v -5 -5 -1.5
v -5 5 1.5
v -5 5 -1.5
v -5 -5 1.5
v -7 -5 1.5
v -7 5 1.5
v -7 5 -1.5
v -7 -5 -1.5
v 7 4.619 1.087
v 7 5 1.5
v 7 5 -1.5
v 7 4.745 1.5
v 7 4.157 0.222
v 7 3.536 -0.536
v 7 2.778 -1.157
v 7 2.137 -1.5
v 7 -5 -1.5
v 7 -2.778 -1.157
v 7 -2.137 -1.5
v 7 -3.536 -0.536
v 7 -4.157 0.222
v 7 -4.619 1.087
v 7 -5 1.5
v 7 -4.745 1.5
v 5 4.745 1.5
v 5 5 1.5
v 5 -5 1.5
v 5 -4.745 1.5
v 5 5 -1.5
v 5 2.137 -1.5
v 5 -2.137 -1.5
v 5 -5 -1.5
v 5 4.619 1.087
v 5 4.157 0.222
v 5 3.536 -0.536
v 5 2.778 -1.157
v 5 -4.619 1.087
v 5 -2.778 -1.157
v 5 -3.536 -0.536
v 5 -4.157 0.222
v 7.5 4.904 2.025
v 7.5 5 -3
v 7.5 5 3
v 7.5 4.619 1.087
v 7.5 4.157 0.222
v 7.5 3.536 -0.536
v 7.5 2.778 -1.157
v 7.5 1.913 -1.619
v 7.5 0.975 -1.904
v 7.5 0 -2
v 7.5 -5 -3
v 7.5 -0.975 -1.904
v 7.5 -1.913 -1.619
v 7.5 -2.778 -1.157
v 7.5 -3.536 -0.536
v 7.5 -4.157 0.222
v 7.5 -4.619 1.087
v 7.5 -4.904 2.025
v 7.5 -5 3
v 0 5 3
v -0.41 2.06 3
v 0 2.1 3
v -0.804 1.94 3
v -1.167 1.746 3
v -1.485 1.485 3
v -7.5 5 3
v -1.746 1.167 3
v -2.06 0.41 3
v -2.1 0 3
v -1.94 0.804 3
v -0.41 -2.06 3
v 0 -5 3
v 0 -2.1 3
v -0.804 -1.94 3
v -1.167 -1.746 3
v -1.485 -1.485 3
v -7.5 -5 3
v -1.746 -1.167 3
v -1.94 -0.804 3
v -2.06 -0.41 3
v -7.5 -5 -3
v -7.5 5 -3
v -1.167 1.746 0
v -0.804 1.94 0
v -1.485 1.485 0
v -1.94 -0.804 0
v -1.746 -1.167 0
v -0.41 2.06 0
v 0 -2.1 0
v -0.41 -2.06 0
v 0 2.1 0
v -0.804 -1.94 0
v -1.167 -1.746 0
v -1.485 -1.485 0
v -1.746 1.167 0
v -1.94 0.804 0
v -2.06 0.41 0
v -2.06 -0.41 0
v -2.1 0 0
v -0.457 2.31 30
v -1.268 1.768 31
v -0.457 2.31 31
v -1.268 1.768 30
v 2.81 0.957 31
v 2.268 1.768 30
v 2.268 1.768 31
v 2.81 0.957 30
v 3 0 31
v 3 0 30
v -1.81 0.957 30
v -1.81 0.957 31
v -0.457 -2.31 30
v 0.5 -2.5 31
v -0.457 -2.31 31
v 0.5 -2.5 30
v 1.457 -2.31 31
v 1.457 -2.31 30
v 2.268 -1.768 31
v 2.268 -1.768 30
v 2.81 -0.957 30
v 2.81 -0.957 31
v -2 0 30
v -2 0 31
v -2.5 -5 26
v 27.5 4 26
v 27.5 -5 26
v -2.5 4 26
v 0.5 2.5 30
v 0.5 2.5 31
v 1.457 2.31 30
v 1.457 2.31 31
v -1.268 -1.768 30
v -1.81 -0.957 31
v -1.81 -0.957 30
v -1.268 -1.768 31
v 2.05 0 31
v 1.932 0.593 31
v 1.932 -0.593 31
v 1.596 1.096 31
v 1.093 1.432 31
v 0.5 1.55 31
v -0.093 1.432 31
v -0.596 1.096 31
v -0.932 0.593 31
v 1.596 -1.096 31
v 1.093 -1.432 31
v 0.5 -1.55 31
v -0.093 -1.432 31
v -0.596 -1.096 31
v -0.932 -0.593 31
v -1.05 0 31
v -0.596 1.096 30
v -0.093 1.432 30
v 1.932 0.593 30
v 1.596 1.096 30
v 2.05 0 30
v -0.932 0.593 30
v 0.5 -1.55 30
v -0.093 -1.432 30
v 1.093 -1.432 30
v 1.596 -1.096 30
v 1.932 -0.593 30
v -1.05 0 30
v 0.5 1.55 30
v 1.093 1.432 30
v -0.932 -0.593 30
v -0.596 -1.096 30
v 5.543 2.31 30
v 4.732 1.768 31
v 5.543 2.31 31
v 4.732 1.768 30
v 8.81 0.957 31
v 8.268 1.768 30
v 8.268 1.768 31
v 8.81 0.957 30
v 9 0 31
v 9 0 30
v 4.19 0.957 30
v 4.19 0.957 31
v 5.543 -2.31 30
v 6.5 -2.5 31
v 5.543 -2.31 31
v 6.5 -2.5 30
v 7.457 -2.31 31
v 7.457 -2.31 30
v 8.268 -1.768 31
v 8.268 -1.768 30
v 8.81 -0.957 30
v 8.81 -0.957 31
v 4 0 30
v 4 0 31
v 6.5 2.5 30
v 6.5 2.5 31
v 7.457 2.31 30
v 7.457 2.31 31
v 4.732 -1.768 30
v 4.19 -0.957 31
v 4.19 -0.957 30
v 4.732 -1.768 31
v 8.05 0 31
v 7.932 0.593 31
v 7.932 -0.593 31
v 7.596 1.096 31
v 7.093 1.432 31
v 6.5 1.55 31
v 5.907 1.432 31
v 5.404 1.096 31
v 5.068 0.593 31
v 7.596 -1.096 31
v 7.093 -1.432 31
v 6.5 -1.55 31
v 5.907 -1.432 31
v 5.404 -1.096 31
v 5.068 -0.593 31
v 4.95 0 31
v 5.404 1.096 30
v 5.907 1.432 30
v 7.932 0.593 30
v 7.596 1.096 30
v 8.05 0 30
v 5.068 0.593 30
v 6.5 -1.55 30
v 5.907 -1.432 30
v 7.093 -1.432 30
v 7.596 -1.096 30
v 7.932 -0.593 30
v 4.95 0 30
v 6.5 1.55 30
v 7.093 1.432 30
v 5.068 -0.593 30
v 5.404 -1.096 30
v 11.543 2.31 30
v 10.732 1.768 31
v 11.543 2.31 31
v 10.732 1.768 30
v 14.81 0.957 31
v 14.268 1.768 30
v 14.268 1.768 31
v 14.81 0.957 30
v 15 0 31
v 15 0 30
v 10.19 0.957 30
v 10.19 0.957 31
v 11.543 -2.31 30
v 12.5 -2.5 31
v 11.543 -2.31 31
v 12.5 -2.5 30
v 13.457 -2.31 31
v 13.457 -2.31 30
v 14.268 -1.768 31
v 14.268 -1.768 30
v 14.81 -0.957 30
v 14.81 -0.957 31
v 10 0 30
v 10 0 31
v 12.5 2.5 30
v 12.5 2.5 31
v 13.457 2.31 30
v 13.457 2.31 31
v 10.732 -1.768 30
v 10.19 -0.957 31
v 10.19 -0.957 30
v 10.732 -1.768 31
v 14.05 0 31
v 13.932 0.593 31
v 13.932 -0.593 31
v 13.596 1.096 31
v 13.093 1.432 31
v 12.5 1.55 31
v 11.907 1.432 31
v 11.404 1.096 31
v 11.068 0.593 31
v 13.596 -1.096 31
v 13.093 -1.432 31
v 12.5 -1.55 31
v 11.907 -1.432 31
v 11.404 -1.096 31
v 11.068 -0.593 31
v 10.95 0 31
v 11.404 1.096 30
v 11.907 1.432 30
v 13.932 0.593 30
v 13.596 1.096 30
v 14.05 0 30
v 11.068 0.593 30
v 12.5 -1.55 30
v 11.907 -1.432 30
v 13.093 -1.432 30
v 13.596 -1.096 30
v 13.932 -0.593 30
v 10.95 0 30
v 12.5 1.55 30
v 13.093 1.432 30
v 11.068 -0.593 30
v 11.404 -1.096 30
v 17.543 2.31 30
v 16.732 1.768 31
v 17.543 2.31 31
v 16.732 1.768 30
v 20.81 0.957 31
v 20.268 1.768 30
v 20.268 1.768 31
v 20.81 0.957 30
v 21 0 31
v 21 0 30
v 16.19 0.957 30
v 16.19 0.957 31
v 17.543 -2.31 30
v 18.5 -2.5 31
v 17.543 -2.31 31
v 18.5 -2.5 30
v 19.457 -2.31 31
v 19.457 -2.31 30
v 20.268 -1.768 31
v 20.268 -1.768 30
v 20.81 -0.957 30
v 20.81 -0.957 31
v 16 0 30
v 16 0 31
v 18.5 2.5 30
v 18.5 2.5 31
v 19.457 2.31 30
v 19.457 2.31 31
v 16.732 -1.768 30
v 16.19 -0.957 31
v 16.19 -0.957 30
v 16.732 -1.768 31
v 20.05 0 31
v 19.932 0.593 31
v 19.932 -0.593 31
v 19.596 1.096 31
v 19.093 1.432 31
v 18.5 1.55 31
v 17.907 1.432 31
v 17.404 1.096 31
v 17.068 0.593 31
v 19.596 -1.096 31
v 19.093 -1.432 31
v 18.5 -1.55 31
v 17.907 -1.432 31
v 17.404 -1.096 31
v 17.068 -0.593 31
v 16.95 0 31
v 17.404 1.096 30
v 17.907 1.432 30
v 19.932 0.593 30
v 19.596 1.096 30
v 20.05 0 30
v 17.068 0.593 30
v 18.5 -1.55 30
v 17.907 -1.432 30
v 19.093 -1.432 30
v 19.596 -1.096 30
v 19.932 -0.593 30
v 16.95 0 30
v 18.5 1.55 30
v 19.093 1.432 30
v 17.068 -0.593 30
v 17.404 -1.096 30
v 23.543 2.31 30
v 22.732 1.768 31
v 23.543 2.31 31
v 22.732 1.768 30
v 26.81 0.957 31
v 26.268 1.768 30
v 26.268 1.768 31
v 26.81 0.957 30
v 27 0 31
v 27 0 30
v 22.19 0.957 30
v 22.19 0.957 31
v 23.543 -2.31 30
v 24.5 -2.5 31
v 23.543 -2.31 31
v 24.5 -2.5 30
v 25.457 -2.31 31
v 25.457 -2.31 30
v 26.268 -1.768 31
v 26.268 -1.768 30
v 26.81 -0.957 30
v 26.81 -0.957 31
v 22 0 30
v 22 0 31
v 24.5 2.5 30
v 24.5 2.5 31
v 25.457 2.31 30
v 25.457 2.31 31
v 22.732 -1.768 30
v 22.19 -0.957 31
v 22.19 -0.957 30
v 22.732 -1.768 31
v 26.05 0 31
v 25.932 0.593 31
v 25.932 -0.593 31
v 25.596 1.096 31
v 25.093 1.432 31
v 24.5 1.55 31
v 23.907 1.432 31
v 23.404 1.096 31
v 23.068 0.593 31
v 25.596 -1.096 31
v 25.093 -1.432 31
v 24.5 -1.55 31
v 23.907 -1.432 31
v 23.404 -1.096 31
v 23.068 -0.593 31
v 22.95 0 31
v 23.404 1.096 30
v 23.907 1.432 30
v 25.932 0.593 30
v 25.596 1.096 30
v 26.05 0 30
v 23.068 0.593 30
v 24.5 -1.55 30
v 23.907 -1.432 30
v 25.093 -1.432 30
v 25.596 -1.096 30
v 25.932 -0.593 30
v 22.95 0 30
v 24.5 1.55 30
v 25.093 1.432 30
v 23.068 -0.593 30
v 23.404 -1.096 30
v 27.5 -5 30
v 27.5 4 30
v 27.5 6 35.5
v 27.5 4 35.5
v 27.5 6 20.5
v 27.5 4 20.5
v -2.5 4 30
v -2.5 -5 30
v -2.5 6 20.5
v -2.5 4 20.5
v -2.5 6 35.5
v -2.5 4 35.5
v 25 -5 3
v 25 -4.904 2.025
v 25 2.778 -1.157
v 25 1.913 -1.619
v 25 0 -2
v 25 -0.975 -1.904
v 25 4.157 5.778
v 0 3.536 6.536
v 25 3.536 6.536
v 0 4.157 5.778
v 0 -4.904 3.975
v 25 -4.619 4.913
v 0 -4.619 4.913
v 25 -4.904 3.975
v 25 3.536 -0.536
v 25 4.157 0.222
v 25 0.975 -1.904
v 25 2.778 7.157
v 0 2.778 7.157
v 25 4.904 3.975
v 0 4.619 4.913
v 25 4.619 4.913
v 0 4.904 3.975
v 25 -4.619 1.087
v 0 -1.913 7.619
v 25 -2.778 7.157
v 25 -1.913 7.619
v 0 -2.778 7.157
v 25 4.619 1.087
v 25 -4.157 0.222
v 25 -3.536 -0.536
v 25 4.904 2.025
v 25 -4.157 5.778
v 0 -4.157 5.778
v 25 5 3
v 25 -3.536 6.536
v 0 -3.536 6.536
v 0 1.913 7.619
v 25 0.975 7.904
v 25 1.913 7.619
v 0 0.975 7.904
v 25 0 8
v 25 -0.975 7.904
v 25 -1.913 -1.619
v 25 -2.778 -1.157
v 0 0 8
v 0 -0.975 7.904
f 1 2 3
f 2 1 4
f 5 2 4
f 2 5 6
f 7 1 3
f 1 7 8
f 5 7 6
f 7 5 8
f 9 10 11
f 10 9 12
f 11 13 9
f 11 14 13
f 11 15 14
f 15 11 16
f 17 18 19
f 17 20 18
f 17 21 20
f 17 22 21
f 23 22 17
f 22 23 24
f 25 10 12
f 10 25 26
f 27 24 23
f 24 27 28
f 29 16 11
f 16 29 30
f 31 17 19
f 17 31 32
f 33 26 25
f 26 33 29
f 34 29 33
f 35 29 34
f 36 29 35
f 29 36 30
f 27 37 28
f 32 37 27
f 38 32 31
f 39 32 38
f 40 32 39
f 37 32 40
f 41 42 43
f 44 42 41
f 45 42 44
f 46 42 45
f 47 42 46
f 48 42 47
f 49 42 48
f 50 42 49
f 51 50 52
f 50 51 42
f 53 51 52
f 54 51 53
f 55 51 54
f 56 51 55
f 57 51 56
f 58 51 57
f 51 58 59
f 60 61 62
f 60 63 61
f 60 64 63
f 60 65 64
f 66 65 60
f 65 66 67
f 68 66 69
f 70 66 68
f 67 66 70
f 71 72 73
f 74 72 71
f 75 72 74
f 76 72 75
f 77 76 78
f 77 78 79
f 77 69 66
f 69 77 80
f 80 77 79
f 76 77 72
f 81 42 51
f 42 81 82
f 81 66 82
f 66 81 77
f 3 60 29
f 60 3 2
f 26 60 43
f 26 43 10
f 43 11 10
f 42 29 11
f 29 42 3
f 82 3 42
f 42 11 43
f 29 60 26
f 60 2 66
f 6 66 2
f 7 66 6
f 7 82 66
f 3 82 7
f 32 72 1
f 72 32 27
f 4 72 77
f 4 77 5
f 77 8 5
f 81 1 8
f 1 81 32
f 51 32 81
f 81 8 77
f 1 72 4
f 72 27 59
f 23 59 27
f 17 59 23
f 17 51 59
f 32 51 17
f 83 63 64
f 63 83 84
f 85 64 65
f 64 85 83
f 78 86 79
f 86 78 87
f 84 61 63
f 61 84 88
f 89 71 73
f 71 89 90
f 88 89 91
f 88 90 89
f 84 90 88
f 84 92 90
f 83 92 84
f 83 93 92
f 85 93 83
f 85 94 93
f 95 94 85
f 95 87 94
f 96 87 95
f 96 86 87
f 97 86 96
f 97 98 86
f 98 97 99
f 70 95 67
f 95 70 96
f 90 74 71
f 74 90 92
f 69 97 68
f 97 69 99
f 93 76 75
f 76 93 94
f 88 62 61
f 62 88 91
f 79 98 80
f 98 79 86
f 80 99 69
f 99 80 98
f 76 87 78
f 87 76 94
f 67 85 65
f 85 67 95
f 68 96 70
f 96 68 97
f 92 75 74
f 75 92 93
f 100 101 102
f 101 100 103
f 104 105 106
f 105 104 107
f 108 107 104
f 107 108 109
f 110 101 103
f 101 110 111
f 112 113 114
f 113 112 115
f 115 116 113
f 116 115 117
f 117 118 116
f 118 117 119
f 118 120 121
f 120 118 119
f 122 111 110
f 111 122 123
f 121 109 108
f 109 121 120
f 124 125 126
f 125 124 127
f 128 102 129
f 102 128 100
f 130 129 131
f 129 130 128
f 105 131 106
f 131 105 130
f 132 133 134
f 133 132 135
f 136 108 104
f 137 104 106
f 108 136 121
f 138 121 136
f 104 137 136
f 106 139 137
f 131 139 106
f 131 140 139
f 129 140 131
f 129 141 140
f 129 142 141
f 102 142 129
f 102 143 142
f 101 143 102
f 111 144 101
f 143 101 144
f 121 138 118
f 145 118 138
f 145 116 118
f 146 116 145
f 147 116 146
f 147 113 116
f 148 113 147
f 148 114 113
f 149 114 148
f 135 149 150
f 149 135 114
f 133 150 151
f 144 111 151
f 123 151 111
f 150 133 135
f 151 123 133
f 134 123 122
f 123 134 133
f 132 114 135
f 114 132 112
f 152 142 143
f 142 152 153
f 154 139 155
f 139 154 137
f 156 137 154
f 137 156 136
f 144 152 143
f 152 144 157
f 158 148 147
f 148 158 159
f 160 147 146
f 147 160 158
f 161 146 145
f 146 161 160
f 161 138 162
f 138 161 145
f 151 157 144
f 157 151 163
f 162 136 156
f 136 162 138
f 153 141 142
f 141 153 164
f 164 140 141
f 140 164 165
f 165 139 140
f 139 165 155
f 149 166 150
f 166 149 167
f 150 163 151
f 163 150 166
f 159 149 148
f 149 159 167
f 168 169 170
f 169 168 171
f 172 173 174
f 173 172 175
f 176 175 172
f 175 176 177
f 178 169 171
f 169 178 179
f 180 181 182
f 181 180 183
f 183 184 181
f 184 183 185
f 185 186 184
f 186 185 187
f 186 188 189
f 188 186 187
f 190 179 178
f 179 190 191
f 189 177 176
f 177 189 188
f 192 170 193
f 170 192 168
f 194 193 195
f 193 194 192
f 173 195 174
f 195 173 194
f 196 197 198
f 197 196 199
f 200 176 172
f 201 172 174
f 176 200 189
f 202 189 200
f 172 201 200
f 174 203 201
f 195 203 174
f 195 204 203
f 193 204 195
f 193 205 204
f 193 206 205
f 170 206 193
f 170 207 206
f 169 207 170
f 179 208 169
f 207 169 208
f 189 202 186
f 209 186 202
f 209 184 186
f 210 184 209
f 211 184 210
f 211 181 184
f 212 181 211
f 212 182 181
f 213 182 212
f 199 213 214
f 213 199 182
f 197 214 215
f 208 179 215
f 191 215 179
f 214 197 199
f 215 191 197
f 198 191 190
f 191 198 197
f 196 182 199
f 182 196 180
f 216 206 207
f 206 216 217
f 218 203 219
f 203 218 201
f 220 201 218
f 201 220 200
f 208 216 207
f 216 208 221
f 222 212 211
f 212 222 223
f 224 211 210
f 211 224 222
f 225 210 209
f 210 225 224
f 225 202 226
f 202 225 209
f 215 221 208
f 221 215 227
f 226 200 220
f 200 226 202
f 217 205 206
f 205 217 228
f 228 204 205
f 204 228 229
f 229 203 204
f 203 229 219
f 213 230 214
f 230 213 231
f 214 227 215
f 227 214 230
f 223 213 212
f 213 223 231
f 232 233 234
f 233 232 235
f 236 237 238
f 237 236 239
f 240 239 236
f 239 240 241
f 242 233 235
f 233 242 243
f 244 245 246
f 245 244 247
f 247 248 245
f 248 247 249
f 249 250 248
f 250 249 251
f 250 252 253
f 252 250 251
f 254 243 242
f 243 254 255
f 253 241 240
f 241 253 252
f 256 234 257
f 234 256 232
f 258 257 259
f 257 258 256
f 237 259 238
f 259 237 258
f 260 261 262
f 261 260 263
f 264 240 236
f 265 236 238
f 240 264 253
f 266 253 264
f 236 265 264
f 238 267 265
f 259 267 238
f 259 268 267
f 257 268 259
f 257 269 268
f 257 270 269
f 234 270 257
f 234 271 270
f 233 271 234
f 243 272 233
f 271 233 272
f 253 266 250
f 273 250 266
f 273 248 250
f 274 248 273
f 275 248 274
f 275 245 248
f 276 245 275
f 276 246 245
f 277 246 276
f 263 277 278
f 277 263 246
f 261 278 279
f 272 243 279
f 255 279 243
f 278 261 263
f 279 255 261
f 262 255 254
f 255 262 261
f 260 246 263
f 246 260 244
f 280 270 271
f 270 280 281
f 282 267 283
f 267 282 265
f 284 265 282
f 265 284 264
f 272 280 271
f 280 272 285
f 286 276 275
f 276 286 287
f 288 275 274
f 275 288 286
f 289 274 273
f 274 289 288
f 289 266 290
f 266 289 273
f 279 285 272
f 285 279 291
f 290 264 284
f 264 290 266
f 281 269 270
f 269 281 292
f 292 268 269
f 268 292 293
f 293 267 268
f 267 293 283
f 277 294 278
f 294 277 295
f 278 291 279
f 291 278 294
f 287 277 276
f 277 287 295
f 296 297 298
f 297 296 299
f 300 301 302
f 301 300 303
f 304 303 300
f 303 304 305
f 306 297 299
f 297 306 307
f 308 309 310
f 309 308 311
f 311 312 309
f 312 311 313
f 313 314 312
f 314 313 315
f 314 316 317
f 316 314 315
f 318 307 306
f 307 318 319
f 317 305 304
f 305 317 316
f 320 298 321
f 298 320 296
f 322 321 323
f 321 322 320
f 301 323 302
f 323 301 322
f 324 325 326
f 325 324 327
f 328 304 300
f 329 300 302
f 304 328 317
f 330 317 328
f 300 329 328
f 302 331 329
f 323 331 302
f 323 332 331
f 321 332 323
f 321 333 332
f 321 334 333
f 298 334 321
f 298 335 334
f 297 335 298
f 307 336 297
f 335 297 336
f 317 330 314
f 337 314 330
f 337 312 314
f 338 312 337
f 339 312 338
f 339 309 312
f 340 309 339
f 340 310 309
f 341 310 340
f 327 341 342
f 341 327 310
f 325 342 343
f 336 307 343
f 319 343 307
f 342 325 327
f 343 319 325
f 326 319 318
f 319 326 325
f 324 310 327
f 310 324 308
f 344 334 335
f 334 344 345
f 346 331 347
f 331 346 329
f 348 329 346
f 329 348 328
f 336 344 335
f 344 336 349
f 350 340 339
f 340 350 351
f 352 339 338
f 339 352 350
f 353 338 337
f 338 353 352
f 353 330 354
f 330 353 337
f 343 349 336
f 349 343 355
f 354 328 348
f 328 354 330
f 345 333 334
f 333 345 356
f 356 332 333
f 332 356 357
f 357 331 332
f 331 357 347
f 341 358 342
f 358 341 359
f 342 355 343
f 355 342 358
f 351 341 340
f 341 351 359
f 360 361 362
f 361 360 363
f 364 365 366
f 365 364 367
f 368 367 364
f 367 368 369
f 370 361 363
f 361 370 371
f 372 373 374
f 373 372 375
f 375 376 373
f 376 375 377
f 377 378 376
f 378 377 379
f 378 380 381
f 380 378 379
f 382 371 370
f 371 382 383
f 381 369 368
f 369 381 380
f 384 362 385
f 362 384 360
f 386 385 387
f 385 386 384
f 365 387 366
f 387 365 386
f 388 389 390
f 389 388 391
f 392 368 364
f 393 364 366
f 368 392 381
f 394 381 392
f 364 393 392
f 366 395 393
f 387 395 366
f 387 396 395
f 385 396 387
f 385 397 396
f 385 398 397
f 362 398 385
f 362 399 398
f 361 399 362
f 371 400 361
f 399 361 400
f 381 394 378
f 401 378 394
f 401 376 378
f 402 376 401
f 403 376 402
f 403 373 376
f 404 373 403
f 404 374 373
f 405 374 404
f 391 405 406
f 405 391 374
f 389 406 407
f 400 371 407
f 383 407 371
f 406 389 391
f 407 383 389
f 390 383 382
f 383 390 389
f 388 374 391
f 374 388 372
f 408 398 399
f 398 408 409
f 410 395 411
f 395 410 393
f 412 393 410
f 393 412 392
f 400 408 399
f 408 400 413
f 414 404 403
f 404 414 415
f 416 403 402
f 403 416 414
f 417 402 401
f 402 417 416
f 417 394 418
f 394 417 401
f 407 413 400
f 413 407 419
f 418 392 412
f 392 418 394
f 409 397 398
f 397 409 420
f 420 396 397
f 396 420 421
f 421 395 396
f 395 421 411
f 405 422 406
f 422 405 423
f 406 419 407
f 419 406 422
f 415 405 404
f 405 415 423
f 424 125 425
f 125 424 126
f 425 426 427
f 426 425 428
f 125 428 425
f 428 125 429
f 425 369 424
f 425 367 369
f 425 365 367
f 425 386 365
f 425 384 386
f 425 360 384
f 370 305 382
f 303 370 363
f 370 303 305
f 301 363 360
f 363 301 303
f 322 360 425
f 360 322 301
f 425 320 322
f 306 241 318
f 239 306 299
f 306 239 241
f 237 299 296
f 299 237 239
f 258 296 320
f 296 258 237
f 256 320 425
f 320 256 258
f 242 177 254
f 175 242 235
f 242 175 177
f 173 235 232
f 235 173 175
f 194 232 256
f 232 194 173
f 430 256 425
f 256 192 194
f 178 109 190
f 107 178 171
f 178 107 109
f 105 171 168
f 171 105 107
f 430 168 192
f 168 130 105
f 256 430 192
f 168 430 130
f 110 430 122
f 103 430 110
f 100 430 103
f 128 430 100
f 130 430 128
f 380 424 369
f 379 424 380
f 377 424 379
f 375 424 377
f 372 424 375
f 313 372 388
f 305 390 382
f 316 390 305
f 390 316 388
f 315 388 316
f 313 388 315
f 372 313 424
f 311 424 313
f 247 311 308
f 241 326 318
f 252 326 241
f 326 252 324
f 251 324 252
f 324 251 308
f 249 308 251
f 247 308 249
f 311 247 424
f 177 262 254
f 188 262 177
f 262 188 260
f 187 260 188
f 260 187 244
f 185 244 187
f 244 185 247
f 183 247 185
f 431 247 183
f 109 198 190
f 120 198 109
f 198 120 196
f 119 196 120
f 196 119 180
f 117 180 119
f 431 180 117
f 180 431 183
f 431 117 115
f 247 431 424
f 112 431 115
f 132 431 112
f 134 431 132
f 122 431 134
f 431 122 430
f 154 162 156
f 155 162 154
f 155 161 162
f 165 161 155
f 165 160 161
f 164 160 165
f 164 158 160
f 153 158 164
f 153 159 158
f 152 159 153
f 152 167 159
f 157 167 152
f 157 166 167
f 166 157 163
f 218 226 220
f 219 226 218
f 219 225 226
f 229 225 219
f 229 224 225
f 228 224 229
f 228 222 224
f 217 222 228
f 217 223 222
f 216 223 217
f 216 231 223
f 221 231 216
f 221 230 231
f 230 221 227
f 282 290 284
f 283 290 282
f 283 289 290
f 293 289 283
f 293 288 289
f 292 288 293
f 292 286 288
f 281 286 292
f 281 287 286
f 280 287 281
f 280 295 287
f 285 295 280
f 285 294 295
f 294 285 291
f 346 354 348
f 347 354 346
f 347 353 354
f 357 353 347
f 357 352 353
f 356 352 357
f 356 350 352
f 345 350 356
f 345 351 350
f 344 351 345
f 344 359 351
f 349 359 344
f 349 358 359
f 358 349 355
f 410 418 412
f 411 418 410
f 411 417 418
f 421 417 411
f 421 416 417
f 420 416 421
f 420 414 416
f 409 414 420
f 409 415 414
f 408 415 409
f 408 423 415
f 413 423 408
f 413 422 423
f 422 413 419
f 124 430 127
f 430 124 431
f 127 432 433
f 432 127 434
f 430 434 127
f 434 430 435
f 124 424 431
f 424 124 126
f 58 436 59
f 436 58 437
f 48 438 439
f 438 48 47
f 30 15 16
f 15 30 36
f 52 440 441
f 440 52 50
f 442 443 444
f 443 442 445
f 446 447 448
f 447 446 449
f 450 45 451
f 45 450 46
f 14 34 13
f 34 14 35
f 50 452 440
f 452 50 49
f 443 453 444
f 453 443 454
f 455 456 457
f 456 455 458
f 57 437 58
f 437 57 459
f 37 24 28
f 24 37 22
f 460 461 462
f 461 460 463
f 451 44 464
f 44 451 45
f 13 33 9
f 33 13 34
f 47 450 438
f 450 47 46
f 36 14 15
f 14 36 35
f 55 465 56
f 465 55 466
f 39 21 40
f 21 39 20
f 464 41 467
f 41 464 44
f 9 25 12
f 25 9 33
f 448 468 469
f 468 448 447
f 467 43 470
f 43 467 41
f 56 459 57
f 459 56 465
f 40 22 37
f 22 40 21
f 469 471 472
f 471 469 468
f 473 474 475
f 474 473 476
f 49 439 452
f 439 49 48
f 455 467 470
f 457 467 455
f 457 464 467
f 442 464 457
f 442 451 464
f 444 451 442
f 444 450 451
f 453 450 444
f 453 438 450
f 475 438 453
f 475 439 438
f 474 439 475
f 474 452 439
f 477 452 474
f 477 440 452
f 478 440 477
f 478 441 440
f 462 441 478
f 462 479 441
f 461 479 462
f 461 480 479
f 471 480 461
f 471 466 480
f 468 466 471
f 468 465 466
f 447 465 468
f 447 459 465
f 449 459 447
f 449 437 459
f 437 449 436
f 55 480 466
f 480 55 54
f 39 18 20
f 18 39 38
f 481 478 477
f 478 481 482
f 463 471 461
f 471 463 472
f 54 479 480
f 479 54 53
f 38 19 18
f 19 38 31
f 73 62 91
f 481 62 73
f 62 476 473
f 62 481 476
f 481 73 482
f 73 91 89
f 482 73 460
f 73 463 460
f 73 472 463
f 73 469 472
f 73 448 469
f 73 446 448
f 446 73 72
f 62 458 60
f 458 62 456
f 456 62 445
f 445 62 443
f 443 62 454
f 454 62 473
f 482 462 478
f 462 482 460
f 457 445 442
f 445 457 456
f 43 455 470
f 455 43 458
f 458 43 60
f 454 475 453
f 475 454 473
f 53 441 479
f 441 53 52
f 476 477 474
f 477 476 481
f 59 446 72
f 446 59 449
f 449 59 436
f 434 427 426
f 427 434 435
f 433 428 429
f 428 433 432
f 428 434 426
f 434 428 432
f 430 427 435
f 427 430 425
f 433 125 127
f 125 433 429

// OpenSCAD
// AstraAnt Tool: Thermal Sorting Rake
// Print handle in PETG. Ceramic tine inserts press-fit into holes.
// (Buy 3mm alumina rods from McMaster-Carr or Amazon)
//
// Print orientation: flat (handle horizontal)
// Supports: none needed

$fn = 32;


// Universal magnetic mount interface
// Clips between ant mandibles, held by neodymium magnets
module magnetic_mount(width=15, depth=10, magnet_d=4) {
    difference() {
        // Mount body
        cube([width, depth, 6], center=true);
        // Magnet pocket (recessed)
        translate([0, 0, 1.5])
            cylinder(d=4+0.2, h=3, center=true, $fn=32);
        // Mandible grip grooves (two channels for ant mandibles)
        for (side = [-1, 1]) {
            translate([side * (width/2 - 1.5), 0, 0])
                cube([2, depth+1, 3], center=true);
        }
    }
}


// Parameters
handle_length = 25;
handle_diameter = 10;
tine_count = 5;
tine_length = 15;
tine_diameter = 3;      // Matches standard alumina rod
tine_spacing = 6;
rake_width = (tine_count - 1) * tine_spacing;

module handle() {
    rotate([0, 90, 0])
        cylinder(d=handle_diameter, h=handle_length);
}

module rake_head() {
    // Cross-bar connecting tines
    cube([rake_width + tine_spacing, handle_diameter, 4], center=true);
    // Tine sockets
    for (i = [0:tine_count-1]) {
        translate([(i - (tine_count-1)/2) * tine_spacing, 0, -2]) {
            difference() {
                cylinder(d=tine_diameter + 2, h=5, $fn=16);
                // Hole for ceramic rod press-fit
                translate([0, 0, -0.1])
                    cylinder(d=tine_diameter + 0.1, h=5.2, $fn=16);
            }
        }
    }
}

module pusher_face() {
    // Flat back of rake doubles as pusher
    translate([0, handle_diameter/2, 0])
        cube([rake_width + tine_spacing, 2, 15], center=true);
}

module thermal_rake_assembly() {
    magnetic_mount();
    translate([0, 0, 3])
        handle();
    translate([handle_length/2, 0, 3 + handle_length])
        rake_head();
    translate([handle_length/2, 0, 3 + handle_length])
        pusher_face();
}

thermal_rake_assembly();
